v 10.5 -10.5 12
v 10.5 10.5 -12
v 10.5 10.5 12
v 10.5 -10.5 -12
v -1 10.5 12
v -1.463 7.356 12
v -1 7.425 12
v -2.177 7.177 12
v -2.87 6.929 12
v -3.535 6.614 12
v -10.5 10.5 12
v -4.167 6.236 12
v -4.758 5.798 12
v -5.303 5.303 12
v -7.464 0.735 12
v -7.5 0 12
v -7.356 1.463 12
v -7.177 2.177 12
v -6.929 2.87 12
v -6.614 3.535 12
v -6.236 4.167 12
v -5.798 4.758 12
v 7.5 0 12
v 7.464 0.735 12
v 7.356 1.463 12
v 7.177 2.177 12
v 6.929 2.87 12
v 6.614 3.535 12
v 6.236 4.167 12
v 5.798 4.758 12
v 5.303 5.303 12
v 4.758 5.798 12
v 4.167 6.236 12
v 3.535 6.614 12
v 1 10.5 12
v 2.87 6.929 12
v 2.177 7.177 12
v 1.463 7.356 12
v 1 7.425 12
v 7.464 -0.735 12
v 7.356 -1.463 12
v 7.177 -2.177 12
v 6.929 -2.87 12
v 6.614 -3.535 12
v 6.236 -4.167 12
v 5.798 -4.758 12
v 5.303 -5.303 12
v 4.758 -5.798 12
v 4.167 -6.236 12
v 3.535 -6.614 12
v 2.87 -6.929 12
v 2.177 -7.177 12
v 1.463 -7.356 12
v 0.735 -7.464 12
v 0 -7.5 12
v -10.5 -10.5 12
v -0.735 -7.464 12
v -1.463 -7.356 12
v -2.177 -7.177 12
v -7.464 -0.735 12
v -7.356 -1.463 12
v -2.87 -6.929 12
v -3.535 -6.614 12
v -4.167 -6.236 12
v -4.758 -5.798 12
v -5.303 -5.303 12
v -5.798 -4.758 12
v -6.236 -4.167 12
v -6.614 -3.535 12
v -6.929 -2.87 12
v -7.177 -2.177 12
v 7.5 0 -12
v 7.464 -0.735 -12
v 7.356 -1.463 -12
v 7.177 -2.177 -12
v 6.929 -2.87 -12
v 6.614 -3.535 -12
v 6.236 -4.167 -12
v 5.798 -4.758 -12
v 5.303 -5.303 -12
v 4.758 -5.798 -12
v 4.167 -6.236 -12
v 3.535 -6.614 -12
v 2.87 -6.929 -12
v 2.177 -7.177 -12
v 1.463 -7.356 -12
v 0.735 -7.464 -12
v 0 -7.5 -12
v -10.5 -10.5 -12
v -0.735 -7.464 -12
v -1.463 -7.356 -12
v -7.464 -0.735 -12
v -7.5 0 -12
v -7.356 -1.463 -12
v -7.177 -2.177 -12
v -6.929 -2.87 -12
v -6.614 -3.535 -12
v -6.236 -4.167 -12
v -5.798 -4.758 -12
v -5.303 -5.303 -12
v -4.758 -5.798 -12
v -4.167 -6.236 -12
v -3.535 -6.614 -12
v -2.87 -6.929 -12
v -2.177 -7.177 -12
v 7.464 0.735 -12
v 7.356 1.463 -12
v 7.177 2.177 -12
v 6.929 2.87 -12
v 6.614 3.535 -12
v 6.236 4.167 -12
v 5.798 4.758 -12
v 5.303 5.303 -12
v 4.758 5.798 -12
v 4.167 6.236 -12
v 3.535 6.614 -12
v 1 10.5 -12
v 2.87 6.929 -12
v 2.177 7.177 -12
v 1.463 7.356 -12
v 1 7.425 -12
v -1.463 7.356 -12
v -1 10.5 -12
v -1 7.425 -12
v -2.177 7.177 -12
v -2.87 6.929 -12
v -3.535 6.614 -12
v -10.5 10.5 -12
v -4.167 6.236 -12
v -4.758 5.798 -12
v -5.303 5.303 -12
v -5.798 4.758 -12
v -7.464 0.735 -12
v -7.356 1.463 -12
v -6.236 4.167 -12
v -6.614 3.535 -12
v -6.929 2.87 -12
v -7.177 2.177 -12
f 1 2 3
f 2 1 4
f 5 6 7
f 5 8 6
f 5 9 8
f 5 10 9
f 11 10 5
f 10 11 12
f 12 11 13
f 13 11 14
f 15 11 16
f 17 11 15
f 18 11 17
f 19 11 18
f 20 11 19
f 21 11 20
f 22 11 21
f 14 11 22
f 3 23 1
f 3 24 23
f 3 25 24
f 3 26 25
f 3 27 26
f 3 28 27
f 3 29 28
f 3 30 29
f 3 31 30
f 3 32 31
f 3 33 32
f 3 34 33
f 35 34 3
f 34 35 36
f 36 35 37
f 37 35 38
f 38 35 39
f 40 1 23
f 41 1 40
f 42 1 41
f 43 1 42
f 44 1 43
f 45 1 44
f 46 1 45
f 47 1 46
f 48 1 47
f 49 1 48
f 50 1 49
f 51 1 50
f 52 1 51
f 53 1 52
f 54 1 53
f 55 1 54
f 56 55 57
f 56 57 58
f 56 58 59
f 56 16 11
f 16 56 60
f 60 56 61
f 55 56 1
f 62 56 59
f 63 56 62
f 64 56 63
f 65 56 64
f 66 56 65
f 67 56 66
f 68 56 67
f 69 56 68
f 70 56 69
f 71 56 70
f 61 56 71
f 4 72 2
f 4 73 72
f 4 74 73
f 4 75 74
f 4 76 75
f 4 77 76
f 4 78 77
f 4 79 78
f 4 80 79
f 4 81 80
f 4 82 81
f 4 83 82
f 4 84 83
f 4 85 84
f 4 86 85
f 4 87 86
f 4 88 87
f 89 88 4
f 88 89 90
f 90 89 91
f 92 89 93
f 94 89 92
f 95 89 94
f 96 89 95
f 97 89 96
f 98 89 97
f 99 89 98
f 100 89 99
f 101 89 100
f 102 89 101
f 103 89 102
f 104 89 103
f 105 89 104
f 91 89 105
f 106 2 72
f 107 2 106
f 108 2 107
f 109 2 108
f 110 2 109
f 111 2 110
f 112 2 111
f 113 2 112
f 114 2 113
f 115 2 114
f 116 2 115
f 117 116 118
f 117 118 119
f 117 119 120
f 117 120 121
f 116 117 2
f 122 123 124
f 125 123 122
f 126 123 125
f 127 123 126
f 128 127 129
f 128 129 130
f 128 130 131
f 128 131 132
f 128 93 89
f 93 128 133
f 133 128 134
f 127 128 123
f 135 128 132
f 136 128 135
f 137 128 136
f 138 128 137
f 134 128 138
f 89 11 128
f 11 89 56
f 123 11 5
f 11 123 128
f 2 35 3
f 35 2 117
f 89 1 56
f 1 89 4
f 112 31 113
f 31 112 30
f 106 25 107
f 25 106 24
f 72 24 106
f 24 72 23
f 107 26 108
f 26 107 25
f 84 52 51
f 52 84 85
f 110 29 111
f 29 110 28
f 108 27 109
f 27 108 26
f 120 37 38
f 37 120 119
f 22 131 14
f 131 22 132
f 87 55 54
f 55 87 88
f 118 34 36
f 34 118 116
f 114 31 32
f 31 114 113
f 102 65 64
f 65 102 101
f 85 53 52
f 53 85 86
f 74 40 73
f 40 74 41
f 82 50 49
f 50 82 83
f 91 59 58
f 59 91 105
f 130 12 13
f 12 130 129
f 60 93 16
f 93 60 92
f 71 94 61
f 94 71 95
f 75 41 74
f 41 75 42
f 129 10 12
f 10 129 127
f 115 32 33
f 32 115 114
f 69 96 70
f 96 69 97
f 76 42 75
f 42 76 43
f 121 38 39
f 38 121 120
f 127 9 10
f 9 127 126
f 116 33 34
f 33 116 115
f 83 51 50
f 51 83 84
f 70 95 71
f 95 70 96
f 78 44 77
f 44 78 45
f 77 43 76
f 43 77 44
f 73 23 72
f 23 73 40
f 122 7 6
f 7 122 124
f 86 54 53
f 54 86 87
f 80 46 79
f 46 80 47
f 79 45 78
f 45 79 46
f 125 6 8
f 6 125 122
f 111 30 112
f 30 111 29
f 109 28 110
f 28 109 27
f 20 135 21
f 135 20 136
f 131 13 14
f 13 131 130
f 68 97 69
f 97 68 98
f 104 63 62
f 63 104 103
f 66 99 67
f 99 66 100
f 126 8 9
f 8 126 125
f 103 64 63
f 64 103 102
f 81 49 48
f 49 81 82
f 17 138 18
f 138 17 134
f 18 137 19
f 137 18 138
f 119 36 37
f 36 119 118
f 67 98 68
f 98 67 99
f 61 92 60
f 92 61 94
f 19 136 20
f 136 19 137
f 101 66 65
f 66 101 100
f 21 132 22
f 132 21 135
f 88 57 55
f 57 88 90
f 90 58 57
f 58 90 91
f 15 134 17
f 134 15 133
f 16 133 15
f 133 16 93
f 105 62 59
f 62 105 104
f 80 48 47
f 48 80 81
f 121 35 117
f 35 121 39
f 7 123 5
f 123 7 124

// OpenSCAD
// LM8UU Linear Bearing Holder
// LM8UU: OD=15mm, ID=8mm, L=24mm
bearing_od = 15;
bearing_id = 8;
bearing_length = 24;
wall = 3;

difference() {
    // Outer body
    cube([bearing_od + wall*2, bearing_od + wall*2, bearing_length], center=true);

    // Bearing pocket
    cylinder(d=bearing_od, h=bearing_length+1, center=true, $fn=64);

    // Through hole for shaft
    cylinder(d=bearing_id, h=bearing_length+10, center=true, $fn=64);

    // Clamping slot
    translate([0, bearing_od/2 + wall/2, 0])
        cube([2, wall+1, bearing_length+1], center=true);
}
